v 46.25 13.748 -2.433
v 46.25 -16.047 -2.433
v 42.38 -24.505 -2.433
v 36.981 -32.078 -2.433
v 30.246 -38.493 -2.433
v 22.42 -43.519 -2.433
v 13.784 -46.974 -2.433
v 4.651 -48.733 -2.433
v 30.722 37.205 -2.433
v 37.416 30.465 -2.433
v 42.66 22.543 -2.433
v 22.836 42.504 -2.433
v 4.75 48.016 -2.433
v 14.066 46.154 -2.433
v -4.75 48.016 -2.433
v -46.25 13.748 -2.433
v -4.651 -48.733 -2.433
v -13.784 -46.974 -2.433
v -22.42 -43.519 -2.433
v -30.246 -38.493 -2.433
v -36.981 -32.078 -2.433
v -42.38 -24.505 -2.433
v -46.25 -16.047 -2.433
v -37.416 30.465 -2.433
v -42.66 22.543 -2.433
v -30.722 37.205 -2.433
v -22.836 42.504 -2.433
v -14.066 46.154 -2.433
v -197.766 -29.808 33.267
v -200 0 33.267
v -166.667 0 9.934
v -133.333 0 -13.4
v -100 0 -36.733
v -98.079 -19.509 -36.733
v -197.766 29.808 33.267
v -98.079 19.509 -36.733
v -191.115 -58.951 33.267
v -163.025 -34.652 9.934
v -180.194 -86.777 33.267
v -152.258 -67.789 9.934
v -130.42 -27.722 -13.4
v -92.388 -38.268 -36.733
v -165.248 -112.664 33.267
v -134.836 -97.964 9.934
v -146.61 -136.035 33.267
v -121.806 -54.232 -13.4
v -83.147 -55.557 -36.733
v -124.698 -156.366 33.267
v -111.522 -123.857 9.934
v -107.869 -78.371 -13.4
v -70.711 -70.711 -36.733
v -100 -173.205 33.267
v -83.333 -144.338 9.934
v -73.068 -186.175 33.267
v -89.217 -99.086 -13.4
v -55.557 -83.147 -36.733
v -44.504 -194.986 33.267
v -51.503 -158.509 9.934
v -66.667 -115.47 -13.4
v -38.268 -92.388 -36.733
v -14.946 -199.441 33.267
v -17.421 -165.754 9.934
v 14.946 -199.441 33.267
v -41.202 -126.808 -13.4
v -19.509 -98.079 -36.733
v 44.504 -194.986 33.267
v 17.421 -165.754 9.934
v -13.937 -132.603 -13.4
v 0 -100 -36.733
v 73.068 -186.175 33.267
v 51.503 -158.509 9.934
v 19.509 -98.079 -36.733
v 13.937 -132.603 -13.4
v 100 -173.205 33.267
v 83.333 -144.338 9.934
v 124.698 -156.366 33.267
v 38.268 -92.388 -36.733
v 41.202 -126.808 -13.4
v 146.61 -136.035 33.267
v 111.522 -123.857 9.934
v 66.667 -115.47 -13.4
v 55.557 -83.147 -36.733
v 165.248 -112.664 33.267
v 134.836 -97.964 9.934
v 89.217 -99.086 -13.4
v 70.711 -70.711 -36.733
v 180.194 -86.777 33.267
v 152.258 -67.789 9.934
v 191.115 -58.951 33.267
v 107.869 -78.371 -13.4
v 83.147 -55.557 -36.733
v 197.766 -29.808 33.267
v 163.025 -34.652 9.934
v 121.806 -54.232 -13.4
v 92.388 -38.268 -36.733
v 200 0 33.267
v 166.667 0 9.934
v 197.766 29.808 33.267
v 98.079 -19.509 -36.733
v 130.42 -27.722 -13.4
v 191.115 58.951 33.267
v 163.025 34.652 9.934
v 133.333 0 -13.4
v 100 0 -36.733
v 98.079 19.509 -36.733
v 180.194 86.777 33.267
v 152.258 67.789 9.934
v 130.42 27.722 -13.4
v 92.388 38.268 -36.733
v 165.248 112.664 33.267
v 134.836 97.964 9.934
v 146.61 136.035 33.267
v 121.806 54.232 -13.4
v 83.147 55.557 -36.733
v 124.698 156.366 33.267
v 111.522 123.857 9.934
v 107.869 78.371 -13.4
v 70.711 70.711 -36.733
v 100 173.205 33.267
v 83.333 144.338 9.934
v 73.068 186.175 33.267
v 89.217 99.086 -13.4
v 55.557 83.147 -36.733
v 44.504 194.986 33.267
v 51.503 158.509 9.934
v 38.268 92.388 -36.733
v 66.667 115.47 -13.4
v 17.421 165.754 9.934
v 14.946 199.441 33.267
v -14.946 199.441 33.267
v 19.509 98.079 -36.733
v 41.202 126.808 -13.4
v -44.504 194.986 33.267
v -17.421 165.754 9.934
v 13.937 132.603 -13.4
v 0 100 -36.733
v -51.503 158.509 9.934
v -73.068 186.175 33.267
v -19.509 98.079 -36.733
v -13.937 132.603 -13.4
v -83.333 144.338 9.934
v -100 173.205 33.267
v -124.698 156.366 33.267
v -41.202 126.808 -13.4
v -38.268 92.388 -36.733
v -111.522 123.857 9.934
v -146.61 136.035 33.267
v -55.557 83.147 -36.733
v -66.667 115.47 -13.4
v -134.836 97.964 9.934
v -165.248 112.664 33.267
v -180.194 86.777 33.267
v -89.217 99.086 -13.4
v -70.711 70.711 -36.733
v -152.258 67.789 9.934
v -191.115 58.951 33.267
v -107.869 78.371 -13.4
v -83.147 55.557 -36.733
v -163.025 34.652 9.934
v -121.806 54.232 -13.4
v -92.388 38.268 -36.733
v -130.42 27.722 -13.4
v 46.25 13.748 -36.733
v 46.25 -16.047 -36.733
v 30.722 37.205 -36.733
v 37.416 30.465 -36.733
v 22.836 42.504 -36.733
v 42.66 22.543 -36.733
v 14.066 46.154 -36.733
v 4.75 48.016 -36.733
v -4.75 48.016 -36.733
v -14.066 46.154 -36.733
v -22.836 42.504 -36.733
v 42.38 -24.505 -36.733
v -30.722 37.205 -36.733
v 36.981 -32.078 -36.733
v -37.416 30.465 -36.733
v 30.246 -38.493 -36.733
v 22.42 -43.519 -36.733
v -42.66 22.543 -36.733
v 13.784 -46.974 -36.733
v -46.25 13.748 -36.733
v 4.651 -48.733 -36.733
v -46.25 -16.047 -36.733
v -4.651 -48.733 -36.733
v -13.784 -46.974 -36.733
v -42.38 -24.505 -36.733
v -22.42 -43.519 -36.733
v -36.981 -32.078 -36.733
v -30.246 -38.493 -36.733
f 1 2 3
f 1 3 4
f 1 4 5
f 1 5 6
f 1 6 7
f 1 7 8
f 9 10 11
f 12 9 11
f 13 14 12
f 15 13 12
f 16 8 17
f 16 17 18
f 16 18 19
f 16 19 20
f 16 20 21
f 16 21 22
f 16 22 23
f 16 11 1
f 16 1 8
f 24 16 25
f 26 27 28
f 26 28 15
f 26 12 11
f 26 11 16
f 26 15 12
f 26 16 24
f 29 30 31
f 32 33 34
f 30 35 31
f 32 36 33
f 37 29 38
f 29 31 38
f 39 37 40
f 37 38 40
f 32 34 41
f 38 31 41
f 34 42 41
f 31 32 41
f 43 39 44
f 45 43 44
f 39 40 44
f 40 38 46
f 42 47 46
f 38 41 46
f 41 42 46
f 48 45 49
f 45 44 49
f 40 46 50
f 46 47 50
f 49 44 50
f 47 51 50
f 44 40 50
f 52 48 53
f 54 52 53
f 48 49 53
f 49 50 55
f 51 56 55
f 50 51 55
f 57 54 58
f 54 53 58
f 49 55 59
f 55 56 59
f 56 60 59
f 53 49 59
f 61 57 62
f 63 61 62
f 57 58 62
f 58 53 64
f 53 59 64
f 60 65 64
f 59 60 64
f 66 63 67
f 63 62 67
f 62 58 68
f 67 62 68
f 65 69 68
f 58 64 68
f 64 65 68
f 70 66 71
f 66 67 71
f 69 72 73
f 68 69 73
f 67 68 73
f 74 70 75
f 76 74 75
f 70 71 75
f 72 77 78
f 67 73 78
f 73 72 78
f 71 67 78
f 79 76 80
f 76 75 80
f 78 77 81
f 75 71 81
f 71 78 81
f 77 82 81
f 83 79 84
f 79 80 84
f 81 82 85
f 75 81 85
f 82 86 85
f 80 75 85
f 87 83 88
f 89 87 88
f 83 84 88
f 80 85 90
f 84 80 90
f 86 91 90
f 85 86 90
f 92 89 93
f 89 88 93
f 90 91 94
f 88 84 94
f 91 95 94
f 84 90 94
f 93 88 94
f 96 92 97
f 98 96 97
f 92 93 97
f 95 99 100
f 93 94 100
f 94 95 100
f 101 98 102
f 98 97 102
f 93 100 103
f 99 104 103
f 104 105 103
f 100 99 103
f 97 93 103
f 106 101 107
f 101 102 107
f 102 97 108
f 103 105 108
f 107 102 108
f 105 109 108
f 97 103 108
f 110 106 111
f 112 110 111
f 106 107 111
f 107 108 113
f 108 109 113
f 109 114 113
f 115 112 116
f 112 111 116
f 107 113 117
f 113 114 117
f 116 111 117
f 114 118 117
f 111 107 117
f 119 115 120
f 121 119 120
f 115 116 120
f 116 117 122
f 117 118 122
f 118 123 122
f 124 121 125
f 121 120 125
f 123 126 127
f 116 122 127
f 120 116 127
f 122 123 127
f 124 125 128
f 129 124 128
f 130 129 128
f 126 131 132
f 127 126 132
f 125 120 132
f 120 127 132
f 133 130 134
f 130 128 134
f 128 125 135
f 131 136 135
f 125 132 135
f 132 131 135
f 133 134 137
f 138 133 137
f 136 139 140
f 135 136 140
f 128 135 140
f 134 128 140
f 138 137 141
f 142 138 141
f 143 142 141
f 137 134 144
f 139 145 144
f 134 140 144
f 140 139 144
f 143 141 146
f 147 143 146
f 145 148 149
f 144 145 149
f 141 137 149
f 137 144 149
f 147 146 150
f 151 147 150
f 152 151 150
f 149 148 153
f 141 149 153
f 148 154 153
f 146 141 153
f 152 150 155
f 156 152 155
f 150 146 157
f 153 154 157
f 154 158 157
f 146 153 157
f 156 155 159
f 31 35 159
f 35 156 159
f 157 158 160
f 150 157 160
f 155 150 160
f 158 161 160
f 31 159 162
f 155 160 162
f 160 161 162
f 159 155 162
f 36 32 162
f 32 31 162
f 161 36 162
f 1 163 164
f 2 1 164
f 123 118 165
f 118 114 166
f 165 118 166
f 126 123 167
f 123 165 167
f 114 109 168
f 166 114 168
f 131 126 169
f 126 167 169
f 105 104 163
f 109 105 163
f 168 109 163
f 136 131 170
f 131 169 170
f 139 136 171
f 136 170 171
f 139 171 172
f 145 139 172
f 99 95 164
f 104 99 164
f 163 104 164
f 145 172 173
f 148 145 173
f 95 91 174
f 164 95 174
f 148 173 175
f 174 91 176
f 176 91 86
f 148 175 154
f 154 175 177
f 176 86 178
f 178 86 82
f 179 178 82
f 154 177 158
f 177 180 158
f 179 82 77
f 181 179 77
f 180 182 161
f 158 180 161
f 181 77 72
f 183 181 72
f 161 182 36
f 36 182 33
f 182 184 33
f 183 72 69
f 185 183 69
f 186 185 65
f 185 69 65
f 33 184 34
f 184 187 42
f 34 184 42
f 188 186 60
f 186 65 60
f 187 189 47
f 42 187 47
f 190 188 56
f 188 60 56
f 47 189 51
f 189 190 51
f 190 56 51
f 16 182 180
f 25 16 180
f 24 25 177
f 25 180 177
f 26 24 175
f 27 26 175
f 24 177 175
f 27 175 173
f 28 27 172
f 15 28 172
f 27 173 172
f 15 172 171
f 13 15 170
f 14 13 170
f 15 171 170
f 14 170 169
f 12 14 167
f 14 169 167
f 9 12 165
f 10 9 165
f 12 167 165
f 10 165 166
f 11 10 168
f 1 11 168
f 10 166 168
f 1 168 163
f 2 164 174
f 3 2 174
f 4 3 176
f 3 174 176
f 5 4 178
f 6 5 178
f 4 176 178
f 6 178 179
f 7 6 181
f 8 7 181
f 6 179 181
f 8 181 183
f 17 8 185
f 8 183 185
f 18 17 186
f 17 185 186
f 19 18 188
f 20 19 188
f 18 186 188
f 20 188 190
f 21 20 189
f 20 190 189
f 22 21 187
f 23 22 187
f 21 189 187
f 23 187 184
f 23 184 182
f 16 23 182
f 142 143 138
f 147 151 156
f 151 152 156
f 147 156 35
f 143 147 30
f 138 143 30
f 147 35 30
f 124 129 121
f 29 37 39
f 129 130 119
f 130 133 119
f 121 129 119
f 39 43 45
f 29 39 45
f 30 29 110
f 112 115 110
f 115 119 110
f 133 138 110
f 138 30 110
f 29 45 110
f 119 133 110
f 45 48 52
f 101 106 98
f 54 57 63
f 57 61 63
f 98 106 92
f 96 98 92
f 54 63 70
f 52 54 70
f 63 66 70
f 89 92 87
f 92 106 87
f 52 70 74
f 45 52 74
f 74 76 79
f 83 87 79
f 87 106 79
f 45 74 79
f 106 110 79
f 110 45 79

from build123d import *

# Parameters (mm, degrees)
CUT_EXTRUDE_1_DEPTH = 34.3


with BuildPart() as part:
    # 草图3 → 旋转1 (revolve)
    with BuildSketch(Plane(origin=(0, 0, 0), x_dir=(1, 0, 0), z_dir=(0, 1, 0))):
        Polygon((-100, 36.733070518), (0, 36.733070518), (0, -33.266929482), (-200, -33.266929482), align=None)
    revolve(axis=Axis((0, 0, -36.733070518), (0, 0, 1)))

    # 草图4 → 切除-拉伸1 (cut)
    with BuildSketch(Plane(origin=(0, 0, -36.733070518), x_dir=(-1, 0, 0), z_dir=(0, 0, -1))):
        with BuildLine():
            Line((-46.25, 13.747727085), (-46.25, -16.046690113))
            ThreePointArc((-46.25, -16.046690113), (0, -48.954660285), (46.25, -16.046690113))
            Line((46.25, -16.046690113), (46.25, 13.747727085))
            ThreePointArc((46.25, 13.747727085), (0, 48.25), (-46.25, 13.747727085))
        make_face()
    extrude(amount=-CUT_EXTRUDE_1_DEPTH, mode=Mode.SUBTRACT)


solid = part.part
